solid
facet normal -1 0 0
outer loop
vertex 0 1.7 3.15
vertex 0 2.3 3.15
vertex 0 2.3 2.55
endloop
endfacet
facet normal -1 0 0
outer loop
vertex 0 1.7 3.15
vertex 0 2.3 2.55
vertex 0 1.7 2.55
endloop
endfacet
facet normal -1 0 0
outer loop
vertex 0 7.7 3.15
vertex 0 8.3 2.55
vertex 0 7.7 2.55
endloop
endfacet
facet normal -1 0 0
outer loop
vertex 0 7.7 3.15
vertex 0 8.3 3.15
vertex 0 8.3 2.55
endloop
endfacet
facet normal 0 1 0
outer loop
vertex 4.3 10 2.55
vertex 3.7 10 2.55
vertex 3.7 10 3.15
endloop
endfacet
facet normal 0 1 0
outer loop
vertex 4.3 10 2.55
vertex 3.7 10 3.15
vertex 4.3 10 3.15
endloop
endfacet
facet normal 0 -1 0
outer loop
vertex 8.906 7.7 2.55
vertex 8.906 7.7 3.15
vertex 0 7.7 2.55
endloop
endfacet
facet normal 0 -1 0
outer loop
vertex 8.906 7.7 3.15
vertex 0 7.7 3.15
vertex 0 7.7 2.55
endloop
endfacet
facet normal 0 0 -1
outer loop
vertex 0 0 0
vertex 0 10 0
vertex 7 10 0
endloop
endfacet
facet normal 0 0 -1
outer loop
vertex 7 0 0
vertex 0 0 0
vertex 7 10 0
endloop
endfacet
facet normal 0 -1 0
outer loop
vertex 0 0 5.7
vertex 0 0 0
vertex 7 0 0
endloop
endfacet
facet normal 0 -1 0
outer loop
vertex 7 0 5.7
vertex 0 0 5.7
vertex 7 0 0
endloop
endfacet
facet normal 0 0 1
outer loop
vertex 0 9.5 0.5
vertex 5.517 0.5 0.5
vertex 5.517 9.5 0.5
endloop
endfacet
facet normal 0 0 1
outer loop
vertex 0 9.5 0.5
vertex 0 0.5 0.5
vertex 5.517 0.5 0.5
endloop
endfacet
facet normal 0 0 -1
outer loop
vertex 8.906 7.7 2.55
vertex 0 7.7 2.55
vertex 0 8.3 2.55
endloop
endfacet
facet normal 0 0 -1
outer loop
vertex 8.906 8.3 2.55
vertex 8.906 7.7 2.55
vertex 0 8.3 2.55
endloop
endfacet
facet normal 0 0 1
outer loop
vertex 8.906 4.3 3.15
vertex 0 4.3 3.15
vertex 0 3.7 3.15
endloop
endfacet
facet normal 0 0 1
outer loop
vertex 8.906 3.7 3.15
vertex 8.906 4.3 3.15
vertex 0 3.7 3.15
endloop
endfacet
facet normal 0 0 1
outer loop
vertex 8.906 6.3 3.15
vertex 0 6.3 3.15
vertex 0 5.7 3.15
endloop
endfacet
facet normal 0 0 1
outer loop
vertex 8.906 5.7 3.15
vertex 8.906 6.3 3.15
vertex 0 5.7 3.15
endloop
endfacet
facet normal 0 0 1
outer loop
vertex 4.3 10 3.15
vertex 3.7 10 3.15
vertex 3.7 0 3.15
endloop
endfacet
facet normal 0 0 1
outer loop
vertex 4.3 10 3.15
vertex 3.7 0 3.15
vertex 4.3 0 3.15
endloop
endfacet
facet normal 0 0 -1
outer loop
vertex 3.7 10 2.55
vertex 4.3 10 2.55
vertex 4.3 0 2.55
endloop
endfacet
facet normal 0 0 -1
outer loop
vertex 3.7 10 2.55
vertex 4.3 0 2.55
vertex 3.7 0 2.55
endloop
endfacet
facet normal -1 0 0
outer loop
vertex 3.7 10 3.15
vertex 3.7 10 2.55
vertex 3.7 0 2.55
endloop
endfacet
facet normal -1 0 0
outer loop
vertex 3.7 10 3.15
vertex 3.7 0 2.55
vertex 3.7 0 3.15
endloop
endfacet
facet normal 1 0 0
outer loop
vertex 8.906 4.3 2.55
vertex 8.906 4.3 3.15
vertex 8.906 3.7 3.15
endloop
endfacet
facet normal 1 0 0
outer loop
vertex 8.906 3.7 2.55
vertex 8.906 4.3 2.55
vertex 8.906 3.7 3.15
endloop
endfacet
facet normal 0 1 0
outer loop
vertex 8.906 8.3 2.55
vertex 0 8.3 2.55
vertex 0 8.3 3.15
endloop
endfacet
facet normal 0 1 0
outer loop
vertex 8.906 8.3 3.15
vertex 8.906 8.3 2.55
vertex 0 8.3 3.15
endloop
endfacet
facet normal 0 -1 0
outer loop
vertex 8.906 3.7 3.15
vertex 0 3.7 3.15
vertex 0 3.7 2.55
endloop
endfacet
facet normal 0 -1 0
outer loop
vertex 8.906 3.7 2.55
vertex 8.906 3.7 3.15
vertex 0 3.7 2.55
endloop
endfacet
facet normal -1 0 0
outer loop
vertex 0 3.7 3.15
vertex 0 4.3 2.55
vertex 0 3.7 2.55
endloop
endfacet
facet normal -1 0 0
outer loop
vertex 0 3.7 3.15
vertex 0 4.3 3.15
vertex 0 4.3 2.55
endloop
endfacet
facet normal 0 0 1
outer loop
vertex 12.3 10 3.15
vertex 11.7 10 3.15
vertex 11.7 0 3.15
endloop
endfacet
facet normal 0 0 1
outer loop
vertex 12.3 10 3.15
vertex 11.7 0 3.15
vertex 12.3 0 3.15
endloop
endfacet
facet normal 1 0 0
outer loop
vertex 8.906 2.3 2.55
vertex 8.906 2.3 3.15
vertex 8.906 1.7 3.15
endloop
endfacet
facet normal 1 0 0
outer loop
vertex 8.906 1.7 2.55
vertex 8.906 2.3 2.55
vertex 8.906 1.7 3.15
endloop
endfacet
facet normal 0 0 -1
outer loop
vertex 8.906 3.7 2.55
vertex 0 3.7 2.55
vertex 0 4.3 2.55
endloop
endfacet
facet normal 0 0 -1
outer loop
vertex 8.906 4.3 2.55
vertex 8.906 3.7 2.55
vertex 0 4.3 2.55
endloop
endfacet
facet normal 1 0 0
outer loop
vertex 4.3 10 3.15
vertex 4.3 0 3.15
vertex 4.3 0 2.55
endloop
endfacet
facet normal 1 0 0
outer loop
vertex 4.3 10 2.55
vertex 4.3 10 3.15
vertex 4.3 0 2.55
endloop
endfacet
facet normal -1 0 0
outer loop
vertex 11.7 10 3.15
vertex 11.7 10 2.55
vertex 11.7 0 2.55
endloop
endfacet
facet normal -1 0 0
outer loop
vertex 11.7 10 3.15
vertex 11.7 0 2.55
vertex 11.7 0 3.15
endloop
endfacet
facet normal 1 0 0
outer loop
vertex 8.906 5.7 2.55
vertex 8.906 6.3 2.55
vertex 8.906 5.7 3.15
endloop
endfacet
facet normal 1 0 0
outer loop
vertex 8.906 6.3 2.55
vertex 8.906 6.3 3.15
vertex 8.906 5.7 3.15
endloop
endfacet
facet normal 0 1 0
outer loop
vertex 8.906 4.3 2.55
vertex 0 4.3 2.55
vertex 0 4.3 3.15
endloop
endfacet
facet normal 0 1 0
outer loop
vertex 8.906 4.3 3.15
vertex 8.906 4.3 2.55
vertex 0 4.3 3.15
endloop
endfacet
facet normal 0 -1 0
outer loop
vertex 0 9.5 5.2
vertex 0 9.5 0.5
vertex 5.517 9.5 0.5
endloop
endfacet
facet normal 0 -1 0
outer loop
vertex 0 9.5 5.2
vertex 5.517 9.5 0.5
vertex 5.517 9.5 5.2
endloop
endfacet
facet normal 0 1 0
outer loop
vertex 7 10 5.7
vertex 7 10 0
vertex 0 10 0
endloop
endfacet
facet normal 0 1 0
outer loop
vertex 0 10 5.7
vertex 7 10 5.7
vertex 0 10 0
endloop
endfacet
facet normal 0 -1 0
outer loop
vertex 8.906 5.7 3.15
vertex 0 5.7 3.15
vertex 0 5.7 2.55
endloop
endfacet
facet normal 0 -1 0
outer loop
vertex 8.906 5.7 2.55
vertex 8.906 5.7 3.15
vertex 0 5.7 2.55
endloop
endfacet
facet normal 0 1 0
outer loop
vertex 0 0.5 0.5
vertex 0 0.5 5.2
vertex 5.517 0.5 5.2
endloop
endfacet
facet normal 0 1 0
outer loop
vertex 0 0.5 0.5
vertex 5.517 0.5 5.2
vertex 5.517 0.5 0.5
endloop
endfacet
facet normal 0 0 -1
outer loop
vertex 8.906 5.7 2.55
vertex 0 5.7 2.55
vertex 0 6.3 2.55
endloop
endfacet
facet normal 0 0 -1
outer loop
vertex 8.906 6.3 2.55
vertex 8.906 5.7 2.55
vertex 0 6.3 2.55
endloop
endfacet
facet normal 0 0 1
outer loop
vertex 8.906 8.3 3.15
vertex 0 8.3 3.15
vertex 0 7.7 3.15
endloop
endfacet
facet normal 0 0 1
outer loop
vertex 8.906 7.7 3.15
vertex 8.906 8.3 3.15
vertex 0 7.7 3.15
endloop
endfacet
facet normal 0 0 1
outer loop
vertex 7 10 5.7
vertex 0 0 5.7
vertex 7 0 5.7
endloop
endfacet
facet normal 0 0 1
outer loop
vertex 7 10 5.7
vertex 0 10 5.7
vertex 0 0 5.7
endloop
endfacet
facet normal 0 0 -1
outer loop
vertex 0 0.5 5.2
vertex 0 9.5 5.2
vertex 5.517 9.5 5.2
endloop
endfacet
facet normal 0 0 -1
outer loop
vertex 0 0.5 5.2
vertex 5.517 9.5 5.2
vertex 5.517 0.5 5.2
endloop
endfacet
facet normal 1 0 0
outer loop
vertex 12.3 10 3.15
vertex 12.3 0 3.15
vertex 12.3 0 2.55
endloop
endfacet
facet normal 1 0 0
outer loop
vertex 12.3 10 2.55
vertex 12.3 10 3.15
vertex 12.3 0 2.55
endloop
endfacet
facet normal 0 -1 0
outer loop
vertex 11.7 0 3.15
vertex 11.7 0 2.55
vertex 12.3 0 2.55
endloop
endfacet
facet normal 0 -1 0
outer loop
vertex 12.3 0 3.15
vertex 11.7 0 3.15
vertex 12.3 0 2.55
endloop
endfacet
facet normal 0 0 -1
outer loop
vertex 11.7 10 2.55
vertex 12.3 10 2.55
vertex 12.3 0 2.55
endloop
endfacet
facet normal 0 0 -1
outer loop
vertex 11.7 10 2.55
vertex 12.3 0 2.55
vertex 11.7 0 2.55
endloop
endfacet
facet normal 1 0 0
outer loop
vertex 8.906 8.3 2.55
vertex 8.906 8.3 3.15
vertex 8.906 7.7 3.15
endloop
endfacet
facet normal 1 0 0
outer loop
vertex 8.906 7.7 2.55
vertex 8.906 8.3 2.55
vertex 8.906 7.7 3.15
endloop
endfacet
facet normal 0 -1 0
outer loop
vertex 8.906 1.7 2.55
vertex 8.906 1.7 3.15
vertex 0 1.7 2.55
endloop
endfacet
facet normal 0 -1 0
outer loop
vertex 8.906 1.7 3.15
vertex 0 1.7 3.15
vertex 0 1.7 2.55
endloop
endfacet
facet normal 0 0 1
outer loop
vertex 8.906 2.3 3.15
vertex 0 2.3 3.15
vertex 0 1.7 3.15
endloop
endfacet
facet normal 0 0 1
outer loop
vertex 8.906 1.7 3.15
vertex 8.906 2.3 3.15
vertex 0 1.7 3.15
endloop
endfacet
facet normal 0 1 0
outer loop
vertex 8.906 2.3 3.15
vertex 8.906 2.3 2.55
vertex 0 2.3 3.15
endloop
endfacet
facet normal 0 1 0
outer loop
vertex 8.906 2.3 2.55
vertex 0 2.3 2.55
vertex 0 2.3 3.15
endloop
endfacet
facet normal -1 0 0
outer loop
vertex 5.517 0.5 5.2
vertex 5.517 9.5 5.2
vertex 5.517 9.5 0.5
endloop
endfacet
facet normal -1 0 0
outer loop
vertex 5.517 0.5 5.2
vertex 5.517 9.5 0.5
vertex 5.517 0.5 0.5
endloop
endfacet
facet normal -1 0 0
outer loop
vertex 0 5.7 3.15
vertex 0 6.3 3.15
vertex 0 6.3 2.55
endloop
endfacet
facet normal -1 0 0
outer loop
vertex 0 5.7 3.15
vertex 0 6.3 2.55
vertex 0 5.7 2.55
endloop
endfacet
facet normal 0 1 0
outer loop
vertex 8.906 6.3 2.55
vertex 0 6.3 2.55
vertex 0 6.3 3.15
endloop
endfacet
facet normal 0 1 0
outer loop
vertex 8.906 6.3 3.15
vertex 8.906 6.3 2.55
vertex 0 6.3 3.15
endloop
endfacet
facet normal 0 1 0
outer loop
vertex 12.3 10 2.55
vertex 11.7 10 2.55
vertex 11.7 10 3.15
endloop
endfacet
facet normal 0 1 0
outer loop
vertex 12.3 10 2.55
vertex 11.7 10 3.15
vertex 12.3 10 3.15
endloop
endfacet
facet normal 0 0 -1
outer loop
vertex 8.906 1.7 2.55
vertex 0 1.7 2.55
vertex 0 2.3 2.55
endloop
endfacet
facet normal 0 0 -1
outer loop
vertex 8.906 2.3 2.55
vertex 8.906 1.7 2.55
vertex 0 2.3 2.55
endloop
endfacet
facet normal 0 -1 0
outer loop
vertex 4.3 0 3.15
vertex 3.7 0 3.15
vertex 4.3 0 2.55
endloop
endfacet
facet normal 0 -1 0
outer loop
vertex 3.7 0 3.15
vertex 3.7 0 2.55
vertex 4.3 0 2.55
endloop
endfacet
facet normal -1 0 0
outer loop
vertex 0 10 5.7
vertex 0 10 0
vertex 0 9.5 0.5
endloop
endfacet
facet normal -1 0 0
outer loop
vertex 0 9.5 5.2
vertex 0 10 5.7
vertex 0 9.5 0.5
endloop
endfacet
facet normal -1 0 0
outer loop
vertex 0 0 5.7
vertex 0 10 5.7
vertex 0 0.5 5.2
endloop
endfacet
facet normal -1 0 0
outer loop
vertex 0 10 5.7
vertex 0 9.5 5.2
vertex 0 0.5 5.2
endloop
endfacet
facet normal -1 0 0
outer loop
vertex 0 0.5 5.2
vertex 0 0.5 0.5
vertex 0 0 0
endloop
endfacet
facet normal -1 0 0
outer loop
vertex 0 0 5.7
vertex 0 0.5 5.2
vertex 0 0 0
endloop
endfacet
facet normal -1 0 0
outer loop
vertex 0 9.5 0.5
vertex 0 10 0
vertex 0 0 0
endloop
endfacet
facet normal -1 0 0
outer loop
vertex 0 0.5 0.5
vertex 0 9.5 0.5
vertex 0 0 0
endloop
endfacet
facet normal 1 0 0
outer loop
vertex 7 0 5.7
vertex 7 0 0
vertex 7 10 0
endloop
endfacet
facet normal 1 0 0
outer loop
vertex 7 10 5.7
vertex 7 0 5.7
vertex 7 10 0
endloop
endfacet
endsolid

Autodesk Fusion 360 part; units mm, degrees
sketch "Sketch1" plane through (0, 0, 0) normal (0, 1, 0) x (1, 0, 0)
  line L0 (0, 0) -> (14, 0)
  line L1 (14, 0) -> (14, -5.7)
  line L2 (14, -5.7) -> (0, -5.7)
  line L3 (0, -5.7) -> (0, 0)
  line L4 (14, -2.85) -> (0, -2.85) construction
  line L5 (7, -5.7) -> (7, 0) construction
  line L6 (5.7, -3.15) -> (6.3, -3.15)
  line L7 (6.3, -3.15) -> (6.3, -2.55)
  line L8 (6.3, -2.55) -> (5.7, -2.55)
  line L9 (5.7, -2.55) -> (5.7, -3.15)
  line L10 (4.3, -2.55) -> (3.7, -2.55)
  line L11 (3.7, -3.15) -> (4.3, -3.15)
  line L12 (3.7, -2.55) -> (3.7, -3.15)
  line L13 (4.3, -3.15) -> (4.3, -2.55)
  line L14 (2.3, -2.55) -> (1.7, -2.55)
  line L15 (1.7, -3.15) -> (2.3, -3.15)
  line L16 (1.7, -2.55) -> (1.7, -3.15)
  line L17 (2.3, -3.15) -> (2.3, -2.55)
  line L18 (8.3, -2.55) -> (7.7, -2.55)
  line L19 (7.7, -3.15) -> (8.3, -3.15)
  line L20 (7.7, -2.55) -> (7.7, -3.15)
  line L21 (8.3, -3.15) -> (8.3, -2.55)
  line L22 (6.3, -2.55) -> (7.7, -3.15) construction
  line L23 (6.3, -3.15) -> (7.7, -2.55) construction
  line L24 (10.3, -3.15) -> (10.3, -2.55)
  line L25 (10.3, -2.55) -> (9.7, -2.55)
  line L26 (9.7, -3.15) -> (10.3, -3.15)
  line L27 (9.7, -2.55) -> (9.7, -3.15)
  line L28 (11.7, -3.15) -> (12.3, -3.15)
  line L29 (12.3, -2.55) -> (11.7, -2.55)
  line L30 (11.7, -2.55) -> (11.7, -3.15)
  line L31 (12.3, -3.15) -> (12.3, -2.55)
  line L32 (0.5, -0.5) -> (13.5, -0.5)
  line L33 (13.5, -0.5) -> (13.5, -5.2)
  line L34 (13.5, -5.2) -> (0.5, -5.2)
  line L35 (0.5, -5.2) -> (0.5, -0.5)
  dimension "d1" = 14
  dimension "d2" = 5.7
  dimension "d3" = 0.6
  dimension "d4" = 0.6
  dimension "d6" = 0.6
  dimension "d7" = 0.6
  dimension "d8" = 0.6
  dimension "d9" = 0.6
  dimension "d10" = 0.6
  dimension "d11" = 0.6
  dimension "d12" = 2
  dimension "d13" = 2
  dimension "d15" = 0.3
  dimension "d16" = 2
  dimension "d17" = 0.6
  dimension "d18" = 0.6
  dimension "d19" = 0.6
  dimension "d20" = 0.6
  dimension "d23" = 0.5
extrude "Extrude1" add sketch "Sketch1" along normal blind 7 contours L0 L1 L2 L3 | L6 L7 L8 L9 | L10 L11 L12 L13 | L14 L15 L16 L17 | L18 L19 L20 L21 | L24 L25 L26 L27 | L28 L29 L30 L31 | L32 L33 L34 L35 makes body 1
extrude "Extrude2" cut sketch "Sketch1" along normal blind 6.5 contours L6 L7 L8 L9 | L10 L11 L12 L13 | L14 L15 L16 L17 | L18 L19 L20 L21 | L24 L25 L26 L27 | L28 L29 L30 L31 | L32 L33 L34 L35 bodies 1
extrude "Extrude3" add sketch "Sketch1" along normal blind 10 separate body contours L6 L7 L8 L9 | L10 L11 L12 L13 | L14 L15 L16 L17 | L18 L19 L20 L21 | L24 L25 L26 L27 | L28 L29 L30 L31 makes body 2 at (8.3, 6.6667, 2.95) makes body 3 at (2.3, 6.6667, 2.95) makes body 4 at (10.3, 6.6667, 2.95) makes body 5 at (6.3, 6.6667, 2.95) makes body 6 at (4.1, 6.6667, 2.55) makes body 7 at (11.7, 6.6667, 2.75)

Autodesk Fusion 360 part; units mm, degrees
sketch "Sketch2" plane through (0, 0, 0) normal (0, 0, 1) x (1, 0, 0)
  line L0 (0, 0) -> (7, 0)
  line L1 (7, 0) -> (7, 10)
  line L2 (7, 10) -> (0, 10)
  line L3 (0, 10) -> (0, 0)
  dimension "d1" = 7
  dimension "d2" = 10
extrude "Extrude1" add sketch "Sketch2" along normal blind 5.7 makes body 1
sketch "Sketch4" plane through (0, 0, 0) normal (-1, 0, 0) x (0, -1, 0)
  line L0 (-10, 0) -> (0, 0)
  line L1 (0, 0) -> (0, 5.7)
  line L2 (0, 5.7) -> (-10, 5.7)
  line L3 (-10, 5.7) -> (-10, 0)
  line L4 (-10, 5.7) -> (0, 5.7)
  line L5 (0, 5.7) -> (0, 0)
  line L6 (0, 0) -> (-10, 0)
  line L7 (-10, 0) -> (-10, 5.7)
  line L8 (-0.5, 0.5) -> (-9.5, 0.5)
  line L9 (-9.5, 0.5) -> (-9.5, 5.2)
  line L10 (-9.5, 5.2) -> (-0.5, 5.2)
  line L11 (-0.5, 5.2) -> (-0.5, 0.5)
  line L12 (-10, 2.85) -> (0, 2.85) construction
  line L13 (-5, 5.7) -> (-5, 0) construction
  line L14 (-6, 5.2) -> (-6, 0.5) construction
  line L15 (-6.3, 3.15) -> (-5.7, 3.15)
  line L16 (-5.7, 3.15) -> (-5.7, 2.55)
  line L17 (-5.7, 2.55) -> (-6.3, 2.55)
  line L18 (-6.3, 2.55) -> (-6.3, 3.15)
  line L19 (-6.3, 3.15) -> (-5.7, 2.55) construction
  line L20 (-5.7, 3.15) -> (-6.3, 2.55) construction
  line L21 (-8.3, 2.55) -> (-8.3, 3.15)
  line L22 (-7.7, 2.55) -> (-8.3, 2.55)
  line L23 (-7.7, 3.15) -> (-7.7, 2.55)
  line L24 (-7.7, 3.15) -> (-8.3, 2.55) construction
  line L25 (-8.3, 3.15) -> (-7.7, 2.55) construction
  line L26 (-8.3, 3.15) -> (-7.7, 3.15)
  line L27 (-4.3, 2.55) -> (-4.3, 3.15)
  line L28 (-3.7, 2.55) -> (-4.3, 2.55)
  line L29 (-3.7, 3.15) -> (-3.7, 2.55)
  line L30 (-3.7, 3.15) -> (-4.3, 2.55) construction
  line L31 (-4.3, 3.15) -> (-3.7, 2.55) construction
  line L32 (-4.3, 3.15) -> (-3.7, 3.15)
  line L33 (-2.3, 2.55) -> (-2.3, 3.15)
  line L34 (-1.7, 2.55) -> (-2.3, 2.55)
  line L35 (-1.7, 3.15) -> (-1.7, 2.55)
  line L36 (-1.7, 3.15) -> (-2.3, 2.55) construction
  line L37 (-2.3, 3.15) -> (-1.7, 2.55) construction
  line L38 (-2.3, 3.15) -> (-1.7, 3.15)
  point P0 (-6, 2.85)
  point P1 (-8, 2.85)
  point P2 (-4, 2.85)
  point P3 (-2, 2.85)
  dimension "d23" = 0.5
  dimension "d24" = 1
  dimension "d25" = 0.6
  dimension "d26" = 0.6
  dimension "d27" = 0.6
  dimension "d28" = 0.6
  dimension "d29" = 0.6
  dimension "d30" = 0.6
  dimension "d31" = 0.6
  dimension "d32" = 0.6
extrude "Extrude3" cut sketch "Sketch4" against normal blind 5.517 contours L8 L9 L10 L11 | L15 L16 L17 L18 | L21 L22 L23 L26 | L27 L28 L29 L32 | L33 L34 L35 L38 bodies 1
extrude "Extrude4" add sketch "Sketch4" against normal blind 8.906 separate body contours L15 L16 L17 L18 | L21 L22 L23 L26 | L27 L28 L29 L32 | L33 L34 L35 L38 makes body 2 at (2.9687, 5.7, 2.95) makes body 3 at (2.9687, 4.3, 2.75) makes body 4 at (2.9687, 8.3, 2.75) makes body 5 at (2.9687, 2.3, 2.75)
